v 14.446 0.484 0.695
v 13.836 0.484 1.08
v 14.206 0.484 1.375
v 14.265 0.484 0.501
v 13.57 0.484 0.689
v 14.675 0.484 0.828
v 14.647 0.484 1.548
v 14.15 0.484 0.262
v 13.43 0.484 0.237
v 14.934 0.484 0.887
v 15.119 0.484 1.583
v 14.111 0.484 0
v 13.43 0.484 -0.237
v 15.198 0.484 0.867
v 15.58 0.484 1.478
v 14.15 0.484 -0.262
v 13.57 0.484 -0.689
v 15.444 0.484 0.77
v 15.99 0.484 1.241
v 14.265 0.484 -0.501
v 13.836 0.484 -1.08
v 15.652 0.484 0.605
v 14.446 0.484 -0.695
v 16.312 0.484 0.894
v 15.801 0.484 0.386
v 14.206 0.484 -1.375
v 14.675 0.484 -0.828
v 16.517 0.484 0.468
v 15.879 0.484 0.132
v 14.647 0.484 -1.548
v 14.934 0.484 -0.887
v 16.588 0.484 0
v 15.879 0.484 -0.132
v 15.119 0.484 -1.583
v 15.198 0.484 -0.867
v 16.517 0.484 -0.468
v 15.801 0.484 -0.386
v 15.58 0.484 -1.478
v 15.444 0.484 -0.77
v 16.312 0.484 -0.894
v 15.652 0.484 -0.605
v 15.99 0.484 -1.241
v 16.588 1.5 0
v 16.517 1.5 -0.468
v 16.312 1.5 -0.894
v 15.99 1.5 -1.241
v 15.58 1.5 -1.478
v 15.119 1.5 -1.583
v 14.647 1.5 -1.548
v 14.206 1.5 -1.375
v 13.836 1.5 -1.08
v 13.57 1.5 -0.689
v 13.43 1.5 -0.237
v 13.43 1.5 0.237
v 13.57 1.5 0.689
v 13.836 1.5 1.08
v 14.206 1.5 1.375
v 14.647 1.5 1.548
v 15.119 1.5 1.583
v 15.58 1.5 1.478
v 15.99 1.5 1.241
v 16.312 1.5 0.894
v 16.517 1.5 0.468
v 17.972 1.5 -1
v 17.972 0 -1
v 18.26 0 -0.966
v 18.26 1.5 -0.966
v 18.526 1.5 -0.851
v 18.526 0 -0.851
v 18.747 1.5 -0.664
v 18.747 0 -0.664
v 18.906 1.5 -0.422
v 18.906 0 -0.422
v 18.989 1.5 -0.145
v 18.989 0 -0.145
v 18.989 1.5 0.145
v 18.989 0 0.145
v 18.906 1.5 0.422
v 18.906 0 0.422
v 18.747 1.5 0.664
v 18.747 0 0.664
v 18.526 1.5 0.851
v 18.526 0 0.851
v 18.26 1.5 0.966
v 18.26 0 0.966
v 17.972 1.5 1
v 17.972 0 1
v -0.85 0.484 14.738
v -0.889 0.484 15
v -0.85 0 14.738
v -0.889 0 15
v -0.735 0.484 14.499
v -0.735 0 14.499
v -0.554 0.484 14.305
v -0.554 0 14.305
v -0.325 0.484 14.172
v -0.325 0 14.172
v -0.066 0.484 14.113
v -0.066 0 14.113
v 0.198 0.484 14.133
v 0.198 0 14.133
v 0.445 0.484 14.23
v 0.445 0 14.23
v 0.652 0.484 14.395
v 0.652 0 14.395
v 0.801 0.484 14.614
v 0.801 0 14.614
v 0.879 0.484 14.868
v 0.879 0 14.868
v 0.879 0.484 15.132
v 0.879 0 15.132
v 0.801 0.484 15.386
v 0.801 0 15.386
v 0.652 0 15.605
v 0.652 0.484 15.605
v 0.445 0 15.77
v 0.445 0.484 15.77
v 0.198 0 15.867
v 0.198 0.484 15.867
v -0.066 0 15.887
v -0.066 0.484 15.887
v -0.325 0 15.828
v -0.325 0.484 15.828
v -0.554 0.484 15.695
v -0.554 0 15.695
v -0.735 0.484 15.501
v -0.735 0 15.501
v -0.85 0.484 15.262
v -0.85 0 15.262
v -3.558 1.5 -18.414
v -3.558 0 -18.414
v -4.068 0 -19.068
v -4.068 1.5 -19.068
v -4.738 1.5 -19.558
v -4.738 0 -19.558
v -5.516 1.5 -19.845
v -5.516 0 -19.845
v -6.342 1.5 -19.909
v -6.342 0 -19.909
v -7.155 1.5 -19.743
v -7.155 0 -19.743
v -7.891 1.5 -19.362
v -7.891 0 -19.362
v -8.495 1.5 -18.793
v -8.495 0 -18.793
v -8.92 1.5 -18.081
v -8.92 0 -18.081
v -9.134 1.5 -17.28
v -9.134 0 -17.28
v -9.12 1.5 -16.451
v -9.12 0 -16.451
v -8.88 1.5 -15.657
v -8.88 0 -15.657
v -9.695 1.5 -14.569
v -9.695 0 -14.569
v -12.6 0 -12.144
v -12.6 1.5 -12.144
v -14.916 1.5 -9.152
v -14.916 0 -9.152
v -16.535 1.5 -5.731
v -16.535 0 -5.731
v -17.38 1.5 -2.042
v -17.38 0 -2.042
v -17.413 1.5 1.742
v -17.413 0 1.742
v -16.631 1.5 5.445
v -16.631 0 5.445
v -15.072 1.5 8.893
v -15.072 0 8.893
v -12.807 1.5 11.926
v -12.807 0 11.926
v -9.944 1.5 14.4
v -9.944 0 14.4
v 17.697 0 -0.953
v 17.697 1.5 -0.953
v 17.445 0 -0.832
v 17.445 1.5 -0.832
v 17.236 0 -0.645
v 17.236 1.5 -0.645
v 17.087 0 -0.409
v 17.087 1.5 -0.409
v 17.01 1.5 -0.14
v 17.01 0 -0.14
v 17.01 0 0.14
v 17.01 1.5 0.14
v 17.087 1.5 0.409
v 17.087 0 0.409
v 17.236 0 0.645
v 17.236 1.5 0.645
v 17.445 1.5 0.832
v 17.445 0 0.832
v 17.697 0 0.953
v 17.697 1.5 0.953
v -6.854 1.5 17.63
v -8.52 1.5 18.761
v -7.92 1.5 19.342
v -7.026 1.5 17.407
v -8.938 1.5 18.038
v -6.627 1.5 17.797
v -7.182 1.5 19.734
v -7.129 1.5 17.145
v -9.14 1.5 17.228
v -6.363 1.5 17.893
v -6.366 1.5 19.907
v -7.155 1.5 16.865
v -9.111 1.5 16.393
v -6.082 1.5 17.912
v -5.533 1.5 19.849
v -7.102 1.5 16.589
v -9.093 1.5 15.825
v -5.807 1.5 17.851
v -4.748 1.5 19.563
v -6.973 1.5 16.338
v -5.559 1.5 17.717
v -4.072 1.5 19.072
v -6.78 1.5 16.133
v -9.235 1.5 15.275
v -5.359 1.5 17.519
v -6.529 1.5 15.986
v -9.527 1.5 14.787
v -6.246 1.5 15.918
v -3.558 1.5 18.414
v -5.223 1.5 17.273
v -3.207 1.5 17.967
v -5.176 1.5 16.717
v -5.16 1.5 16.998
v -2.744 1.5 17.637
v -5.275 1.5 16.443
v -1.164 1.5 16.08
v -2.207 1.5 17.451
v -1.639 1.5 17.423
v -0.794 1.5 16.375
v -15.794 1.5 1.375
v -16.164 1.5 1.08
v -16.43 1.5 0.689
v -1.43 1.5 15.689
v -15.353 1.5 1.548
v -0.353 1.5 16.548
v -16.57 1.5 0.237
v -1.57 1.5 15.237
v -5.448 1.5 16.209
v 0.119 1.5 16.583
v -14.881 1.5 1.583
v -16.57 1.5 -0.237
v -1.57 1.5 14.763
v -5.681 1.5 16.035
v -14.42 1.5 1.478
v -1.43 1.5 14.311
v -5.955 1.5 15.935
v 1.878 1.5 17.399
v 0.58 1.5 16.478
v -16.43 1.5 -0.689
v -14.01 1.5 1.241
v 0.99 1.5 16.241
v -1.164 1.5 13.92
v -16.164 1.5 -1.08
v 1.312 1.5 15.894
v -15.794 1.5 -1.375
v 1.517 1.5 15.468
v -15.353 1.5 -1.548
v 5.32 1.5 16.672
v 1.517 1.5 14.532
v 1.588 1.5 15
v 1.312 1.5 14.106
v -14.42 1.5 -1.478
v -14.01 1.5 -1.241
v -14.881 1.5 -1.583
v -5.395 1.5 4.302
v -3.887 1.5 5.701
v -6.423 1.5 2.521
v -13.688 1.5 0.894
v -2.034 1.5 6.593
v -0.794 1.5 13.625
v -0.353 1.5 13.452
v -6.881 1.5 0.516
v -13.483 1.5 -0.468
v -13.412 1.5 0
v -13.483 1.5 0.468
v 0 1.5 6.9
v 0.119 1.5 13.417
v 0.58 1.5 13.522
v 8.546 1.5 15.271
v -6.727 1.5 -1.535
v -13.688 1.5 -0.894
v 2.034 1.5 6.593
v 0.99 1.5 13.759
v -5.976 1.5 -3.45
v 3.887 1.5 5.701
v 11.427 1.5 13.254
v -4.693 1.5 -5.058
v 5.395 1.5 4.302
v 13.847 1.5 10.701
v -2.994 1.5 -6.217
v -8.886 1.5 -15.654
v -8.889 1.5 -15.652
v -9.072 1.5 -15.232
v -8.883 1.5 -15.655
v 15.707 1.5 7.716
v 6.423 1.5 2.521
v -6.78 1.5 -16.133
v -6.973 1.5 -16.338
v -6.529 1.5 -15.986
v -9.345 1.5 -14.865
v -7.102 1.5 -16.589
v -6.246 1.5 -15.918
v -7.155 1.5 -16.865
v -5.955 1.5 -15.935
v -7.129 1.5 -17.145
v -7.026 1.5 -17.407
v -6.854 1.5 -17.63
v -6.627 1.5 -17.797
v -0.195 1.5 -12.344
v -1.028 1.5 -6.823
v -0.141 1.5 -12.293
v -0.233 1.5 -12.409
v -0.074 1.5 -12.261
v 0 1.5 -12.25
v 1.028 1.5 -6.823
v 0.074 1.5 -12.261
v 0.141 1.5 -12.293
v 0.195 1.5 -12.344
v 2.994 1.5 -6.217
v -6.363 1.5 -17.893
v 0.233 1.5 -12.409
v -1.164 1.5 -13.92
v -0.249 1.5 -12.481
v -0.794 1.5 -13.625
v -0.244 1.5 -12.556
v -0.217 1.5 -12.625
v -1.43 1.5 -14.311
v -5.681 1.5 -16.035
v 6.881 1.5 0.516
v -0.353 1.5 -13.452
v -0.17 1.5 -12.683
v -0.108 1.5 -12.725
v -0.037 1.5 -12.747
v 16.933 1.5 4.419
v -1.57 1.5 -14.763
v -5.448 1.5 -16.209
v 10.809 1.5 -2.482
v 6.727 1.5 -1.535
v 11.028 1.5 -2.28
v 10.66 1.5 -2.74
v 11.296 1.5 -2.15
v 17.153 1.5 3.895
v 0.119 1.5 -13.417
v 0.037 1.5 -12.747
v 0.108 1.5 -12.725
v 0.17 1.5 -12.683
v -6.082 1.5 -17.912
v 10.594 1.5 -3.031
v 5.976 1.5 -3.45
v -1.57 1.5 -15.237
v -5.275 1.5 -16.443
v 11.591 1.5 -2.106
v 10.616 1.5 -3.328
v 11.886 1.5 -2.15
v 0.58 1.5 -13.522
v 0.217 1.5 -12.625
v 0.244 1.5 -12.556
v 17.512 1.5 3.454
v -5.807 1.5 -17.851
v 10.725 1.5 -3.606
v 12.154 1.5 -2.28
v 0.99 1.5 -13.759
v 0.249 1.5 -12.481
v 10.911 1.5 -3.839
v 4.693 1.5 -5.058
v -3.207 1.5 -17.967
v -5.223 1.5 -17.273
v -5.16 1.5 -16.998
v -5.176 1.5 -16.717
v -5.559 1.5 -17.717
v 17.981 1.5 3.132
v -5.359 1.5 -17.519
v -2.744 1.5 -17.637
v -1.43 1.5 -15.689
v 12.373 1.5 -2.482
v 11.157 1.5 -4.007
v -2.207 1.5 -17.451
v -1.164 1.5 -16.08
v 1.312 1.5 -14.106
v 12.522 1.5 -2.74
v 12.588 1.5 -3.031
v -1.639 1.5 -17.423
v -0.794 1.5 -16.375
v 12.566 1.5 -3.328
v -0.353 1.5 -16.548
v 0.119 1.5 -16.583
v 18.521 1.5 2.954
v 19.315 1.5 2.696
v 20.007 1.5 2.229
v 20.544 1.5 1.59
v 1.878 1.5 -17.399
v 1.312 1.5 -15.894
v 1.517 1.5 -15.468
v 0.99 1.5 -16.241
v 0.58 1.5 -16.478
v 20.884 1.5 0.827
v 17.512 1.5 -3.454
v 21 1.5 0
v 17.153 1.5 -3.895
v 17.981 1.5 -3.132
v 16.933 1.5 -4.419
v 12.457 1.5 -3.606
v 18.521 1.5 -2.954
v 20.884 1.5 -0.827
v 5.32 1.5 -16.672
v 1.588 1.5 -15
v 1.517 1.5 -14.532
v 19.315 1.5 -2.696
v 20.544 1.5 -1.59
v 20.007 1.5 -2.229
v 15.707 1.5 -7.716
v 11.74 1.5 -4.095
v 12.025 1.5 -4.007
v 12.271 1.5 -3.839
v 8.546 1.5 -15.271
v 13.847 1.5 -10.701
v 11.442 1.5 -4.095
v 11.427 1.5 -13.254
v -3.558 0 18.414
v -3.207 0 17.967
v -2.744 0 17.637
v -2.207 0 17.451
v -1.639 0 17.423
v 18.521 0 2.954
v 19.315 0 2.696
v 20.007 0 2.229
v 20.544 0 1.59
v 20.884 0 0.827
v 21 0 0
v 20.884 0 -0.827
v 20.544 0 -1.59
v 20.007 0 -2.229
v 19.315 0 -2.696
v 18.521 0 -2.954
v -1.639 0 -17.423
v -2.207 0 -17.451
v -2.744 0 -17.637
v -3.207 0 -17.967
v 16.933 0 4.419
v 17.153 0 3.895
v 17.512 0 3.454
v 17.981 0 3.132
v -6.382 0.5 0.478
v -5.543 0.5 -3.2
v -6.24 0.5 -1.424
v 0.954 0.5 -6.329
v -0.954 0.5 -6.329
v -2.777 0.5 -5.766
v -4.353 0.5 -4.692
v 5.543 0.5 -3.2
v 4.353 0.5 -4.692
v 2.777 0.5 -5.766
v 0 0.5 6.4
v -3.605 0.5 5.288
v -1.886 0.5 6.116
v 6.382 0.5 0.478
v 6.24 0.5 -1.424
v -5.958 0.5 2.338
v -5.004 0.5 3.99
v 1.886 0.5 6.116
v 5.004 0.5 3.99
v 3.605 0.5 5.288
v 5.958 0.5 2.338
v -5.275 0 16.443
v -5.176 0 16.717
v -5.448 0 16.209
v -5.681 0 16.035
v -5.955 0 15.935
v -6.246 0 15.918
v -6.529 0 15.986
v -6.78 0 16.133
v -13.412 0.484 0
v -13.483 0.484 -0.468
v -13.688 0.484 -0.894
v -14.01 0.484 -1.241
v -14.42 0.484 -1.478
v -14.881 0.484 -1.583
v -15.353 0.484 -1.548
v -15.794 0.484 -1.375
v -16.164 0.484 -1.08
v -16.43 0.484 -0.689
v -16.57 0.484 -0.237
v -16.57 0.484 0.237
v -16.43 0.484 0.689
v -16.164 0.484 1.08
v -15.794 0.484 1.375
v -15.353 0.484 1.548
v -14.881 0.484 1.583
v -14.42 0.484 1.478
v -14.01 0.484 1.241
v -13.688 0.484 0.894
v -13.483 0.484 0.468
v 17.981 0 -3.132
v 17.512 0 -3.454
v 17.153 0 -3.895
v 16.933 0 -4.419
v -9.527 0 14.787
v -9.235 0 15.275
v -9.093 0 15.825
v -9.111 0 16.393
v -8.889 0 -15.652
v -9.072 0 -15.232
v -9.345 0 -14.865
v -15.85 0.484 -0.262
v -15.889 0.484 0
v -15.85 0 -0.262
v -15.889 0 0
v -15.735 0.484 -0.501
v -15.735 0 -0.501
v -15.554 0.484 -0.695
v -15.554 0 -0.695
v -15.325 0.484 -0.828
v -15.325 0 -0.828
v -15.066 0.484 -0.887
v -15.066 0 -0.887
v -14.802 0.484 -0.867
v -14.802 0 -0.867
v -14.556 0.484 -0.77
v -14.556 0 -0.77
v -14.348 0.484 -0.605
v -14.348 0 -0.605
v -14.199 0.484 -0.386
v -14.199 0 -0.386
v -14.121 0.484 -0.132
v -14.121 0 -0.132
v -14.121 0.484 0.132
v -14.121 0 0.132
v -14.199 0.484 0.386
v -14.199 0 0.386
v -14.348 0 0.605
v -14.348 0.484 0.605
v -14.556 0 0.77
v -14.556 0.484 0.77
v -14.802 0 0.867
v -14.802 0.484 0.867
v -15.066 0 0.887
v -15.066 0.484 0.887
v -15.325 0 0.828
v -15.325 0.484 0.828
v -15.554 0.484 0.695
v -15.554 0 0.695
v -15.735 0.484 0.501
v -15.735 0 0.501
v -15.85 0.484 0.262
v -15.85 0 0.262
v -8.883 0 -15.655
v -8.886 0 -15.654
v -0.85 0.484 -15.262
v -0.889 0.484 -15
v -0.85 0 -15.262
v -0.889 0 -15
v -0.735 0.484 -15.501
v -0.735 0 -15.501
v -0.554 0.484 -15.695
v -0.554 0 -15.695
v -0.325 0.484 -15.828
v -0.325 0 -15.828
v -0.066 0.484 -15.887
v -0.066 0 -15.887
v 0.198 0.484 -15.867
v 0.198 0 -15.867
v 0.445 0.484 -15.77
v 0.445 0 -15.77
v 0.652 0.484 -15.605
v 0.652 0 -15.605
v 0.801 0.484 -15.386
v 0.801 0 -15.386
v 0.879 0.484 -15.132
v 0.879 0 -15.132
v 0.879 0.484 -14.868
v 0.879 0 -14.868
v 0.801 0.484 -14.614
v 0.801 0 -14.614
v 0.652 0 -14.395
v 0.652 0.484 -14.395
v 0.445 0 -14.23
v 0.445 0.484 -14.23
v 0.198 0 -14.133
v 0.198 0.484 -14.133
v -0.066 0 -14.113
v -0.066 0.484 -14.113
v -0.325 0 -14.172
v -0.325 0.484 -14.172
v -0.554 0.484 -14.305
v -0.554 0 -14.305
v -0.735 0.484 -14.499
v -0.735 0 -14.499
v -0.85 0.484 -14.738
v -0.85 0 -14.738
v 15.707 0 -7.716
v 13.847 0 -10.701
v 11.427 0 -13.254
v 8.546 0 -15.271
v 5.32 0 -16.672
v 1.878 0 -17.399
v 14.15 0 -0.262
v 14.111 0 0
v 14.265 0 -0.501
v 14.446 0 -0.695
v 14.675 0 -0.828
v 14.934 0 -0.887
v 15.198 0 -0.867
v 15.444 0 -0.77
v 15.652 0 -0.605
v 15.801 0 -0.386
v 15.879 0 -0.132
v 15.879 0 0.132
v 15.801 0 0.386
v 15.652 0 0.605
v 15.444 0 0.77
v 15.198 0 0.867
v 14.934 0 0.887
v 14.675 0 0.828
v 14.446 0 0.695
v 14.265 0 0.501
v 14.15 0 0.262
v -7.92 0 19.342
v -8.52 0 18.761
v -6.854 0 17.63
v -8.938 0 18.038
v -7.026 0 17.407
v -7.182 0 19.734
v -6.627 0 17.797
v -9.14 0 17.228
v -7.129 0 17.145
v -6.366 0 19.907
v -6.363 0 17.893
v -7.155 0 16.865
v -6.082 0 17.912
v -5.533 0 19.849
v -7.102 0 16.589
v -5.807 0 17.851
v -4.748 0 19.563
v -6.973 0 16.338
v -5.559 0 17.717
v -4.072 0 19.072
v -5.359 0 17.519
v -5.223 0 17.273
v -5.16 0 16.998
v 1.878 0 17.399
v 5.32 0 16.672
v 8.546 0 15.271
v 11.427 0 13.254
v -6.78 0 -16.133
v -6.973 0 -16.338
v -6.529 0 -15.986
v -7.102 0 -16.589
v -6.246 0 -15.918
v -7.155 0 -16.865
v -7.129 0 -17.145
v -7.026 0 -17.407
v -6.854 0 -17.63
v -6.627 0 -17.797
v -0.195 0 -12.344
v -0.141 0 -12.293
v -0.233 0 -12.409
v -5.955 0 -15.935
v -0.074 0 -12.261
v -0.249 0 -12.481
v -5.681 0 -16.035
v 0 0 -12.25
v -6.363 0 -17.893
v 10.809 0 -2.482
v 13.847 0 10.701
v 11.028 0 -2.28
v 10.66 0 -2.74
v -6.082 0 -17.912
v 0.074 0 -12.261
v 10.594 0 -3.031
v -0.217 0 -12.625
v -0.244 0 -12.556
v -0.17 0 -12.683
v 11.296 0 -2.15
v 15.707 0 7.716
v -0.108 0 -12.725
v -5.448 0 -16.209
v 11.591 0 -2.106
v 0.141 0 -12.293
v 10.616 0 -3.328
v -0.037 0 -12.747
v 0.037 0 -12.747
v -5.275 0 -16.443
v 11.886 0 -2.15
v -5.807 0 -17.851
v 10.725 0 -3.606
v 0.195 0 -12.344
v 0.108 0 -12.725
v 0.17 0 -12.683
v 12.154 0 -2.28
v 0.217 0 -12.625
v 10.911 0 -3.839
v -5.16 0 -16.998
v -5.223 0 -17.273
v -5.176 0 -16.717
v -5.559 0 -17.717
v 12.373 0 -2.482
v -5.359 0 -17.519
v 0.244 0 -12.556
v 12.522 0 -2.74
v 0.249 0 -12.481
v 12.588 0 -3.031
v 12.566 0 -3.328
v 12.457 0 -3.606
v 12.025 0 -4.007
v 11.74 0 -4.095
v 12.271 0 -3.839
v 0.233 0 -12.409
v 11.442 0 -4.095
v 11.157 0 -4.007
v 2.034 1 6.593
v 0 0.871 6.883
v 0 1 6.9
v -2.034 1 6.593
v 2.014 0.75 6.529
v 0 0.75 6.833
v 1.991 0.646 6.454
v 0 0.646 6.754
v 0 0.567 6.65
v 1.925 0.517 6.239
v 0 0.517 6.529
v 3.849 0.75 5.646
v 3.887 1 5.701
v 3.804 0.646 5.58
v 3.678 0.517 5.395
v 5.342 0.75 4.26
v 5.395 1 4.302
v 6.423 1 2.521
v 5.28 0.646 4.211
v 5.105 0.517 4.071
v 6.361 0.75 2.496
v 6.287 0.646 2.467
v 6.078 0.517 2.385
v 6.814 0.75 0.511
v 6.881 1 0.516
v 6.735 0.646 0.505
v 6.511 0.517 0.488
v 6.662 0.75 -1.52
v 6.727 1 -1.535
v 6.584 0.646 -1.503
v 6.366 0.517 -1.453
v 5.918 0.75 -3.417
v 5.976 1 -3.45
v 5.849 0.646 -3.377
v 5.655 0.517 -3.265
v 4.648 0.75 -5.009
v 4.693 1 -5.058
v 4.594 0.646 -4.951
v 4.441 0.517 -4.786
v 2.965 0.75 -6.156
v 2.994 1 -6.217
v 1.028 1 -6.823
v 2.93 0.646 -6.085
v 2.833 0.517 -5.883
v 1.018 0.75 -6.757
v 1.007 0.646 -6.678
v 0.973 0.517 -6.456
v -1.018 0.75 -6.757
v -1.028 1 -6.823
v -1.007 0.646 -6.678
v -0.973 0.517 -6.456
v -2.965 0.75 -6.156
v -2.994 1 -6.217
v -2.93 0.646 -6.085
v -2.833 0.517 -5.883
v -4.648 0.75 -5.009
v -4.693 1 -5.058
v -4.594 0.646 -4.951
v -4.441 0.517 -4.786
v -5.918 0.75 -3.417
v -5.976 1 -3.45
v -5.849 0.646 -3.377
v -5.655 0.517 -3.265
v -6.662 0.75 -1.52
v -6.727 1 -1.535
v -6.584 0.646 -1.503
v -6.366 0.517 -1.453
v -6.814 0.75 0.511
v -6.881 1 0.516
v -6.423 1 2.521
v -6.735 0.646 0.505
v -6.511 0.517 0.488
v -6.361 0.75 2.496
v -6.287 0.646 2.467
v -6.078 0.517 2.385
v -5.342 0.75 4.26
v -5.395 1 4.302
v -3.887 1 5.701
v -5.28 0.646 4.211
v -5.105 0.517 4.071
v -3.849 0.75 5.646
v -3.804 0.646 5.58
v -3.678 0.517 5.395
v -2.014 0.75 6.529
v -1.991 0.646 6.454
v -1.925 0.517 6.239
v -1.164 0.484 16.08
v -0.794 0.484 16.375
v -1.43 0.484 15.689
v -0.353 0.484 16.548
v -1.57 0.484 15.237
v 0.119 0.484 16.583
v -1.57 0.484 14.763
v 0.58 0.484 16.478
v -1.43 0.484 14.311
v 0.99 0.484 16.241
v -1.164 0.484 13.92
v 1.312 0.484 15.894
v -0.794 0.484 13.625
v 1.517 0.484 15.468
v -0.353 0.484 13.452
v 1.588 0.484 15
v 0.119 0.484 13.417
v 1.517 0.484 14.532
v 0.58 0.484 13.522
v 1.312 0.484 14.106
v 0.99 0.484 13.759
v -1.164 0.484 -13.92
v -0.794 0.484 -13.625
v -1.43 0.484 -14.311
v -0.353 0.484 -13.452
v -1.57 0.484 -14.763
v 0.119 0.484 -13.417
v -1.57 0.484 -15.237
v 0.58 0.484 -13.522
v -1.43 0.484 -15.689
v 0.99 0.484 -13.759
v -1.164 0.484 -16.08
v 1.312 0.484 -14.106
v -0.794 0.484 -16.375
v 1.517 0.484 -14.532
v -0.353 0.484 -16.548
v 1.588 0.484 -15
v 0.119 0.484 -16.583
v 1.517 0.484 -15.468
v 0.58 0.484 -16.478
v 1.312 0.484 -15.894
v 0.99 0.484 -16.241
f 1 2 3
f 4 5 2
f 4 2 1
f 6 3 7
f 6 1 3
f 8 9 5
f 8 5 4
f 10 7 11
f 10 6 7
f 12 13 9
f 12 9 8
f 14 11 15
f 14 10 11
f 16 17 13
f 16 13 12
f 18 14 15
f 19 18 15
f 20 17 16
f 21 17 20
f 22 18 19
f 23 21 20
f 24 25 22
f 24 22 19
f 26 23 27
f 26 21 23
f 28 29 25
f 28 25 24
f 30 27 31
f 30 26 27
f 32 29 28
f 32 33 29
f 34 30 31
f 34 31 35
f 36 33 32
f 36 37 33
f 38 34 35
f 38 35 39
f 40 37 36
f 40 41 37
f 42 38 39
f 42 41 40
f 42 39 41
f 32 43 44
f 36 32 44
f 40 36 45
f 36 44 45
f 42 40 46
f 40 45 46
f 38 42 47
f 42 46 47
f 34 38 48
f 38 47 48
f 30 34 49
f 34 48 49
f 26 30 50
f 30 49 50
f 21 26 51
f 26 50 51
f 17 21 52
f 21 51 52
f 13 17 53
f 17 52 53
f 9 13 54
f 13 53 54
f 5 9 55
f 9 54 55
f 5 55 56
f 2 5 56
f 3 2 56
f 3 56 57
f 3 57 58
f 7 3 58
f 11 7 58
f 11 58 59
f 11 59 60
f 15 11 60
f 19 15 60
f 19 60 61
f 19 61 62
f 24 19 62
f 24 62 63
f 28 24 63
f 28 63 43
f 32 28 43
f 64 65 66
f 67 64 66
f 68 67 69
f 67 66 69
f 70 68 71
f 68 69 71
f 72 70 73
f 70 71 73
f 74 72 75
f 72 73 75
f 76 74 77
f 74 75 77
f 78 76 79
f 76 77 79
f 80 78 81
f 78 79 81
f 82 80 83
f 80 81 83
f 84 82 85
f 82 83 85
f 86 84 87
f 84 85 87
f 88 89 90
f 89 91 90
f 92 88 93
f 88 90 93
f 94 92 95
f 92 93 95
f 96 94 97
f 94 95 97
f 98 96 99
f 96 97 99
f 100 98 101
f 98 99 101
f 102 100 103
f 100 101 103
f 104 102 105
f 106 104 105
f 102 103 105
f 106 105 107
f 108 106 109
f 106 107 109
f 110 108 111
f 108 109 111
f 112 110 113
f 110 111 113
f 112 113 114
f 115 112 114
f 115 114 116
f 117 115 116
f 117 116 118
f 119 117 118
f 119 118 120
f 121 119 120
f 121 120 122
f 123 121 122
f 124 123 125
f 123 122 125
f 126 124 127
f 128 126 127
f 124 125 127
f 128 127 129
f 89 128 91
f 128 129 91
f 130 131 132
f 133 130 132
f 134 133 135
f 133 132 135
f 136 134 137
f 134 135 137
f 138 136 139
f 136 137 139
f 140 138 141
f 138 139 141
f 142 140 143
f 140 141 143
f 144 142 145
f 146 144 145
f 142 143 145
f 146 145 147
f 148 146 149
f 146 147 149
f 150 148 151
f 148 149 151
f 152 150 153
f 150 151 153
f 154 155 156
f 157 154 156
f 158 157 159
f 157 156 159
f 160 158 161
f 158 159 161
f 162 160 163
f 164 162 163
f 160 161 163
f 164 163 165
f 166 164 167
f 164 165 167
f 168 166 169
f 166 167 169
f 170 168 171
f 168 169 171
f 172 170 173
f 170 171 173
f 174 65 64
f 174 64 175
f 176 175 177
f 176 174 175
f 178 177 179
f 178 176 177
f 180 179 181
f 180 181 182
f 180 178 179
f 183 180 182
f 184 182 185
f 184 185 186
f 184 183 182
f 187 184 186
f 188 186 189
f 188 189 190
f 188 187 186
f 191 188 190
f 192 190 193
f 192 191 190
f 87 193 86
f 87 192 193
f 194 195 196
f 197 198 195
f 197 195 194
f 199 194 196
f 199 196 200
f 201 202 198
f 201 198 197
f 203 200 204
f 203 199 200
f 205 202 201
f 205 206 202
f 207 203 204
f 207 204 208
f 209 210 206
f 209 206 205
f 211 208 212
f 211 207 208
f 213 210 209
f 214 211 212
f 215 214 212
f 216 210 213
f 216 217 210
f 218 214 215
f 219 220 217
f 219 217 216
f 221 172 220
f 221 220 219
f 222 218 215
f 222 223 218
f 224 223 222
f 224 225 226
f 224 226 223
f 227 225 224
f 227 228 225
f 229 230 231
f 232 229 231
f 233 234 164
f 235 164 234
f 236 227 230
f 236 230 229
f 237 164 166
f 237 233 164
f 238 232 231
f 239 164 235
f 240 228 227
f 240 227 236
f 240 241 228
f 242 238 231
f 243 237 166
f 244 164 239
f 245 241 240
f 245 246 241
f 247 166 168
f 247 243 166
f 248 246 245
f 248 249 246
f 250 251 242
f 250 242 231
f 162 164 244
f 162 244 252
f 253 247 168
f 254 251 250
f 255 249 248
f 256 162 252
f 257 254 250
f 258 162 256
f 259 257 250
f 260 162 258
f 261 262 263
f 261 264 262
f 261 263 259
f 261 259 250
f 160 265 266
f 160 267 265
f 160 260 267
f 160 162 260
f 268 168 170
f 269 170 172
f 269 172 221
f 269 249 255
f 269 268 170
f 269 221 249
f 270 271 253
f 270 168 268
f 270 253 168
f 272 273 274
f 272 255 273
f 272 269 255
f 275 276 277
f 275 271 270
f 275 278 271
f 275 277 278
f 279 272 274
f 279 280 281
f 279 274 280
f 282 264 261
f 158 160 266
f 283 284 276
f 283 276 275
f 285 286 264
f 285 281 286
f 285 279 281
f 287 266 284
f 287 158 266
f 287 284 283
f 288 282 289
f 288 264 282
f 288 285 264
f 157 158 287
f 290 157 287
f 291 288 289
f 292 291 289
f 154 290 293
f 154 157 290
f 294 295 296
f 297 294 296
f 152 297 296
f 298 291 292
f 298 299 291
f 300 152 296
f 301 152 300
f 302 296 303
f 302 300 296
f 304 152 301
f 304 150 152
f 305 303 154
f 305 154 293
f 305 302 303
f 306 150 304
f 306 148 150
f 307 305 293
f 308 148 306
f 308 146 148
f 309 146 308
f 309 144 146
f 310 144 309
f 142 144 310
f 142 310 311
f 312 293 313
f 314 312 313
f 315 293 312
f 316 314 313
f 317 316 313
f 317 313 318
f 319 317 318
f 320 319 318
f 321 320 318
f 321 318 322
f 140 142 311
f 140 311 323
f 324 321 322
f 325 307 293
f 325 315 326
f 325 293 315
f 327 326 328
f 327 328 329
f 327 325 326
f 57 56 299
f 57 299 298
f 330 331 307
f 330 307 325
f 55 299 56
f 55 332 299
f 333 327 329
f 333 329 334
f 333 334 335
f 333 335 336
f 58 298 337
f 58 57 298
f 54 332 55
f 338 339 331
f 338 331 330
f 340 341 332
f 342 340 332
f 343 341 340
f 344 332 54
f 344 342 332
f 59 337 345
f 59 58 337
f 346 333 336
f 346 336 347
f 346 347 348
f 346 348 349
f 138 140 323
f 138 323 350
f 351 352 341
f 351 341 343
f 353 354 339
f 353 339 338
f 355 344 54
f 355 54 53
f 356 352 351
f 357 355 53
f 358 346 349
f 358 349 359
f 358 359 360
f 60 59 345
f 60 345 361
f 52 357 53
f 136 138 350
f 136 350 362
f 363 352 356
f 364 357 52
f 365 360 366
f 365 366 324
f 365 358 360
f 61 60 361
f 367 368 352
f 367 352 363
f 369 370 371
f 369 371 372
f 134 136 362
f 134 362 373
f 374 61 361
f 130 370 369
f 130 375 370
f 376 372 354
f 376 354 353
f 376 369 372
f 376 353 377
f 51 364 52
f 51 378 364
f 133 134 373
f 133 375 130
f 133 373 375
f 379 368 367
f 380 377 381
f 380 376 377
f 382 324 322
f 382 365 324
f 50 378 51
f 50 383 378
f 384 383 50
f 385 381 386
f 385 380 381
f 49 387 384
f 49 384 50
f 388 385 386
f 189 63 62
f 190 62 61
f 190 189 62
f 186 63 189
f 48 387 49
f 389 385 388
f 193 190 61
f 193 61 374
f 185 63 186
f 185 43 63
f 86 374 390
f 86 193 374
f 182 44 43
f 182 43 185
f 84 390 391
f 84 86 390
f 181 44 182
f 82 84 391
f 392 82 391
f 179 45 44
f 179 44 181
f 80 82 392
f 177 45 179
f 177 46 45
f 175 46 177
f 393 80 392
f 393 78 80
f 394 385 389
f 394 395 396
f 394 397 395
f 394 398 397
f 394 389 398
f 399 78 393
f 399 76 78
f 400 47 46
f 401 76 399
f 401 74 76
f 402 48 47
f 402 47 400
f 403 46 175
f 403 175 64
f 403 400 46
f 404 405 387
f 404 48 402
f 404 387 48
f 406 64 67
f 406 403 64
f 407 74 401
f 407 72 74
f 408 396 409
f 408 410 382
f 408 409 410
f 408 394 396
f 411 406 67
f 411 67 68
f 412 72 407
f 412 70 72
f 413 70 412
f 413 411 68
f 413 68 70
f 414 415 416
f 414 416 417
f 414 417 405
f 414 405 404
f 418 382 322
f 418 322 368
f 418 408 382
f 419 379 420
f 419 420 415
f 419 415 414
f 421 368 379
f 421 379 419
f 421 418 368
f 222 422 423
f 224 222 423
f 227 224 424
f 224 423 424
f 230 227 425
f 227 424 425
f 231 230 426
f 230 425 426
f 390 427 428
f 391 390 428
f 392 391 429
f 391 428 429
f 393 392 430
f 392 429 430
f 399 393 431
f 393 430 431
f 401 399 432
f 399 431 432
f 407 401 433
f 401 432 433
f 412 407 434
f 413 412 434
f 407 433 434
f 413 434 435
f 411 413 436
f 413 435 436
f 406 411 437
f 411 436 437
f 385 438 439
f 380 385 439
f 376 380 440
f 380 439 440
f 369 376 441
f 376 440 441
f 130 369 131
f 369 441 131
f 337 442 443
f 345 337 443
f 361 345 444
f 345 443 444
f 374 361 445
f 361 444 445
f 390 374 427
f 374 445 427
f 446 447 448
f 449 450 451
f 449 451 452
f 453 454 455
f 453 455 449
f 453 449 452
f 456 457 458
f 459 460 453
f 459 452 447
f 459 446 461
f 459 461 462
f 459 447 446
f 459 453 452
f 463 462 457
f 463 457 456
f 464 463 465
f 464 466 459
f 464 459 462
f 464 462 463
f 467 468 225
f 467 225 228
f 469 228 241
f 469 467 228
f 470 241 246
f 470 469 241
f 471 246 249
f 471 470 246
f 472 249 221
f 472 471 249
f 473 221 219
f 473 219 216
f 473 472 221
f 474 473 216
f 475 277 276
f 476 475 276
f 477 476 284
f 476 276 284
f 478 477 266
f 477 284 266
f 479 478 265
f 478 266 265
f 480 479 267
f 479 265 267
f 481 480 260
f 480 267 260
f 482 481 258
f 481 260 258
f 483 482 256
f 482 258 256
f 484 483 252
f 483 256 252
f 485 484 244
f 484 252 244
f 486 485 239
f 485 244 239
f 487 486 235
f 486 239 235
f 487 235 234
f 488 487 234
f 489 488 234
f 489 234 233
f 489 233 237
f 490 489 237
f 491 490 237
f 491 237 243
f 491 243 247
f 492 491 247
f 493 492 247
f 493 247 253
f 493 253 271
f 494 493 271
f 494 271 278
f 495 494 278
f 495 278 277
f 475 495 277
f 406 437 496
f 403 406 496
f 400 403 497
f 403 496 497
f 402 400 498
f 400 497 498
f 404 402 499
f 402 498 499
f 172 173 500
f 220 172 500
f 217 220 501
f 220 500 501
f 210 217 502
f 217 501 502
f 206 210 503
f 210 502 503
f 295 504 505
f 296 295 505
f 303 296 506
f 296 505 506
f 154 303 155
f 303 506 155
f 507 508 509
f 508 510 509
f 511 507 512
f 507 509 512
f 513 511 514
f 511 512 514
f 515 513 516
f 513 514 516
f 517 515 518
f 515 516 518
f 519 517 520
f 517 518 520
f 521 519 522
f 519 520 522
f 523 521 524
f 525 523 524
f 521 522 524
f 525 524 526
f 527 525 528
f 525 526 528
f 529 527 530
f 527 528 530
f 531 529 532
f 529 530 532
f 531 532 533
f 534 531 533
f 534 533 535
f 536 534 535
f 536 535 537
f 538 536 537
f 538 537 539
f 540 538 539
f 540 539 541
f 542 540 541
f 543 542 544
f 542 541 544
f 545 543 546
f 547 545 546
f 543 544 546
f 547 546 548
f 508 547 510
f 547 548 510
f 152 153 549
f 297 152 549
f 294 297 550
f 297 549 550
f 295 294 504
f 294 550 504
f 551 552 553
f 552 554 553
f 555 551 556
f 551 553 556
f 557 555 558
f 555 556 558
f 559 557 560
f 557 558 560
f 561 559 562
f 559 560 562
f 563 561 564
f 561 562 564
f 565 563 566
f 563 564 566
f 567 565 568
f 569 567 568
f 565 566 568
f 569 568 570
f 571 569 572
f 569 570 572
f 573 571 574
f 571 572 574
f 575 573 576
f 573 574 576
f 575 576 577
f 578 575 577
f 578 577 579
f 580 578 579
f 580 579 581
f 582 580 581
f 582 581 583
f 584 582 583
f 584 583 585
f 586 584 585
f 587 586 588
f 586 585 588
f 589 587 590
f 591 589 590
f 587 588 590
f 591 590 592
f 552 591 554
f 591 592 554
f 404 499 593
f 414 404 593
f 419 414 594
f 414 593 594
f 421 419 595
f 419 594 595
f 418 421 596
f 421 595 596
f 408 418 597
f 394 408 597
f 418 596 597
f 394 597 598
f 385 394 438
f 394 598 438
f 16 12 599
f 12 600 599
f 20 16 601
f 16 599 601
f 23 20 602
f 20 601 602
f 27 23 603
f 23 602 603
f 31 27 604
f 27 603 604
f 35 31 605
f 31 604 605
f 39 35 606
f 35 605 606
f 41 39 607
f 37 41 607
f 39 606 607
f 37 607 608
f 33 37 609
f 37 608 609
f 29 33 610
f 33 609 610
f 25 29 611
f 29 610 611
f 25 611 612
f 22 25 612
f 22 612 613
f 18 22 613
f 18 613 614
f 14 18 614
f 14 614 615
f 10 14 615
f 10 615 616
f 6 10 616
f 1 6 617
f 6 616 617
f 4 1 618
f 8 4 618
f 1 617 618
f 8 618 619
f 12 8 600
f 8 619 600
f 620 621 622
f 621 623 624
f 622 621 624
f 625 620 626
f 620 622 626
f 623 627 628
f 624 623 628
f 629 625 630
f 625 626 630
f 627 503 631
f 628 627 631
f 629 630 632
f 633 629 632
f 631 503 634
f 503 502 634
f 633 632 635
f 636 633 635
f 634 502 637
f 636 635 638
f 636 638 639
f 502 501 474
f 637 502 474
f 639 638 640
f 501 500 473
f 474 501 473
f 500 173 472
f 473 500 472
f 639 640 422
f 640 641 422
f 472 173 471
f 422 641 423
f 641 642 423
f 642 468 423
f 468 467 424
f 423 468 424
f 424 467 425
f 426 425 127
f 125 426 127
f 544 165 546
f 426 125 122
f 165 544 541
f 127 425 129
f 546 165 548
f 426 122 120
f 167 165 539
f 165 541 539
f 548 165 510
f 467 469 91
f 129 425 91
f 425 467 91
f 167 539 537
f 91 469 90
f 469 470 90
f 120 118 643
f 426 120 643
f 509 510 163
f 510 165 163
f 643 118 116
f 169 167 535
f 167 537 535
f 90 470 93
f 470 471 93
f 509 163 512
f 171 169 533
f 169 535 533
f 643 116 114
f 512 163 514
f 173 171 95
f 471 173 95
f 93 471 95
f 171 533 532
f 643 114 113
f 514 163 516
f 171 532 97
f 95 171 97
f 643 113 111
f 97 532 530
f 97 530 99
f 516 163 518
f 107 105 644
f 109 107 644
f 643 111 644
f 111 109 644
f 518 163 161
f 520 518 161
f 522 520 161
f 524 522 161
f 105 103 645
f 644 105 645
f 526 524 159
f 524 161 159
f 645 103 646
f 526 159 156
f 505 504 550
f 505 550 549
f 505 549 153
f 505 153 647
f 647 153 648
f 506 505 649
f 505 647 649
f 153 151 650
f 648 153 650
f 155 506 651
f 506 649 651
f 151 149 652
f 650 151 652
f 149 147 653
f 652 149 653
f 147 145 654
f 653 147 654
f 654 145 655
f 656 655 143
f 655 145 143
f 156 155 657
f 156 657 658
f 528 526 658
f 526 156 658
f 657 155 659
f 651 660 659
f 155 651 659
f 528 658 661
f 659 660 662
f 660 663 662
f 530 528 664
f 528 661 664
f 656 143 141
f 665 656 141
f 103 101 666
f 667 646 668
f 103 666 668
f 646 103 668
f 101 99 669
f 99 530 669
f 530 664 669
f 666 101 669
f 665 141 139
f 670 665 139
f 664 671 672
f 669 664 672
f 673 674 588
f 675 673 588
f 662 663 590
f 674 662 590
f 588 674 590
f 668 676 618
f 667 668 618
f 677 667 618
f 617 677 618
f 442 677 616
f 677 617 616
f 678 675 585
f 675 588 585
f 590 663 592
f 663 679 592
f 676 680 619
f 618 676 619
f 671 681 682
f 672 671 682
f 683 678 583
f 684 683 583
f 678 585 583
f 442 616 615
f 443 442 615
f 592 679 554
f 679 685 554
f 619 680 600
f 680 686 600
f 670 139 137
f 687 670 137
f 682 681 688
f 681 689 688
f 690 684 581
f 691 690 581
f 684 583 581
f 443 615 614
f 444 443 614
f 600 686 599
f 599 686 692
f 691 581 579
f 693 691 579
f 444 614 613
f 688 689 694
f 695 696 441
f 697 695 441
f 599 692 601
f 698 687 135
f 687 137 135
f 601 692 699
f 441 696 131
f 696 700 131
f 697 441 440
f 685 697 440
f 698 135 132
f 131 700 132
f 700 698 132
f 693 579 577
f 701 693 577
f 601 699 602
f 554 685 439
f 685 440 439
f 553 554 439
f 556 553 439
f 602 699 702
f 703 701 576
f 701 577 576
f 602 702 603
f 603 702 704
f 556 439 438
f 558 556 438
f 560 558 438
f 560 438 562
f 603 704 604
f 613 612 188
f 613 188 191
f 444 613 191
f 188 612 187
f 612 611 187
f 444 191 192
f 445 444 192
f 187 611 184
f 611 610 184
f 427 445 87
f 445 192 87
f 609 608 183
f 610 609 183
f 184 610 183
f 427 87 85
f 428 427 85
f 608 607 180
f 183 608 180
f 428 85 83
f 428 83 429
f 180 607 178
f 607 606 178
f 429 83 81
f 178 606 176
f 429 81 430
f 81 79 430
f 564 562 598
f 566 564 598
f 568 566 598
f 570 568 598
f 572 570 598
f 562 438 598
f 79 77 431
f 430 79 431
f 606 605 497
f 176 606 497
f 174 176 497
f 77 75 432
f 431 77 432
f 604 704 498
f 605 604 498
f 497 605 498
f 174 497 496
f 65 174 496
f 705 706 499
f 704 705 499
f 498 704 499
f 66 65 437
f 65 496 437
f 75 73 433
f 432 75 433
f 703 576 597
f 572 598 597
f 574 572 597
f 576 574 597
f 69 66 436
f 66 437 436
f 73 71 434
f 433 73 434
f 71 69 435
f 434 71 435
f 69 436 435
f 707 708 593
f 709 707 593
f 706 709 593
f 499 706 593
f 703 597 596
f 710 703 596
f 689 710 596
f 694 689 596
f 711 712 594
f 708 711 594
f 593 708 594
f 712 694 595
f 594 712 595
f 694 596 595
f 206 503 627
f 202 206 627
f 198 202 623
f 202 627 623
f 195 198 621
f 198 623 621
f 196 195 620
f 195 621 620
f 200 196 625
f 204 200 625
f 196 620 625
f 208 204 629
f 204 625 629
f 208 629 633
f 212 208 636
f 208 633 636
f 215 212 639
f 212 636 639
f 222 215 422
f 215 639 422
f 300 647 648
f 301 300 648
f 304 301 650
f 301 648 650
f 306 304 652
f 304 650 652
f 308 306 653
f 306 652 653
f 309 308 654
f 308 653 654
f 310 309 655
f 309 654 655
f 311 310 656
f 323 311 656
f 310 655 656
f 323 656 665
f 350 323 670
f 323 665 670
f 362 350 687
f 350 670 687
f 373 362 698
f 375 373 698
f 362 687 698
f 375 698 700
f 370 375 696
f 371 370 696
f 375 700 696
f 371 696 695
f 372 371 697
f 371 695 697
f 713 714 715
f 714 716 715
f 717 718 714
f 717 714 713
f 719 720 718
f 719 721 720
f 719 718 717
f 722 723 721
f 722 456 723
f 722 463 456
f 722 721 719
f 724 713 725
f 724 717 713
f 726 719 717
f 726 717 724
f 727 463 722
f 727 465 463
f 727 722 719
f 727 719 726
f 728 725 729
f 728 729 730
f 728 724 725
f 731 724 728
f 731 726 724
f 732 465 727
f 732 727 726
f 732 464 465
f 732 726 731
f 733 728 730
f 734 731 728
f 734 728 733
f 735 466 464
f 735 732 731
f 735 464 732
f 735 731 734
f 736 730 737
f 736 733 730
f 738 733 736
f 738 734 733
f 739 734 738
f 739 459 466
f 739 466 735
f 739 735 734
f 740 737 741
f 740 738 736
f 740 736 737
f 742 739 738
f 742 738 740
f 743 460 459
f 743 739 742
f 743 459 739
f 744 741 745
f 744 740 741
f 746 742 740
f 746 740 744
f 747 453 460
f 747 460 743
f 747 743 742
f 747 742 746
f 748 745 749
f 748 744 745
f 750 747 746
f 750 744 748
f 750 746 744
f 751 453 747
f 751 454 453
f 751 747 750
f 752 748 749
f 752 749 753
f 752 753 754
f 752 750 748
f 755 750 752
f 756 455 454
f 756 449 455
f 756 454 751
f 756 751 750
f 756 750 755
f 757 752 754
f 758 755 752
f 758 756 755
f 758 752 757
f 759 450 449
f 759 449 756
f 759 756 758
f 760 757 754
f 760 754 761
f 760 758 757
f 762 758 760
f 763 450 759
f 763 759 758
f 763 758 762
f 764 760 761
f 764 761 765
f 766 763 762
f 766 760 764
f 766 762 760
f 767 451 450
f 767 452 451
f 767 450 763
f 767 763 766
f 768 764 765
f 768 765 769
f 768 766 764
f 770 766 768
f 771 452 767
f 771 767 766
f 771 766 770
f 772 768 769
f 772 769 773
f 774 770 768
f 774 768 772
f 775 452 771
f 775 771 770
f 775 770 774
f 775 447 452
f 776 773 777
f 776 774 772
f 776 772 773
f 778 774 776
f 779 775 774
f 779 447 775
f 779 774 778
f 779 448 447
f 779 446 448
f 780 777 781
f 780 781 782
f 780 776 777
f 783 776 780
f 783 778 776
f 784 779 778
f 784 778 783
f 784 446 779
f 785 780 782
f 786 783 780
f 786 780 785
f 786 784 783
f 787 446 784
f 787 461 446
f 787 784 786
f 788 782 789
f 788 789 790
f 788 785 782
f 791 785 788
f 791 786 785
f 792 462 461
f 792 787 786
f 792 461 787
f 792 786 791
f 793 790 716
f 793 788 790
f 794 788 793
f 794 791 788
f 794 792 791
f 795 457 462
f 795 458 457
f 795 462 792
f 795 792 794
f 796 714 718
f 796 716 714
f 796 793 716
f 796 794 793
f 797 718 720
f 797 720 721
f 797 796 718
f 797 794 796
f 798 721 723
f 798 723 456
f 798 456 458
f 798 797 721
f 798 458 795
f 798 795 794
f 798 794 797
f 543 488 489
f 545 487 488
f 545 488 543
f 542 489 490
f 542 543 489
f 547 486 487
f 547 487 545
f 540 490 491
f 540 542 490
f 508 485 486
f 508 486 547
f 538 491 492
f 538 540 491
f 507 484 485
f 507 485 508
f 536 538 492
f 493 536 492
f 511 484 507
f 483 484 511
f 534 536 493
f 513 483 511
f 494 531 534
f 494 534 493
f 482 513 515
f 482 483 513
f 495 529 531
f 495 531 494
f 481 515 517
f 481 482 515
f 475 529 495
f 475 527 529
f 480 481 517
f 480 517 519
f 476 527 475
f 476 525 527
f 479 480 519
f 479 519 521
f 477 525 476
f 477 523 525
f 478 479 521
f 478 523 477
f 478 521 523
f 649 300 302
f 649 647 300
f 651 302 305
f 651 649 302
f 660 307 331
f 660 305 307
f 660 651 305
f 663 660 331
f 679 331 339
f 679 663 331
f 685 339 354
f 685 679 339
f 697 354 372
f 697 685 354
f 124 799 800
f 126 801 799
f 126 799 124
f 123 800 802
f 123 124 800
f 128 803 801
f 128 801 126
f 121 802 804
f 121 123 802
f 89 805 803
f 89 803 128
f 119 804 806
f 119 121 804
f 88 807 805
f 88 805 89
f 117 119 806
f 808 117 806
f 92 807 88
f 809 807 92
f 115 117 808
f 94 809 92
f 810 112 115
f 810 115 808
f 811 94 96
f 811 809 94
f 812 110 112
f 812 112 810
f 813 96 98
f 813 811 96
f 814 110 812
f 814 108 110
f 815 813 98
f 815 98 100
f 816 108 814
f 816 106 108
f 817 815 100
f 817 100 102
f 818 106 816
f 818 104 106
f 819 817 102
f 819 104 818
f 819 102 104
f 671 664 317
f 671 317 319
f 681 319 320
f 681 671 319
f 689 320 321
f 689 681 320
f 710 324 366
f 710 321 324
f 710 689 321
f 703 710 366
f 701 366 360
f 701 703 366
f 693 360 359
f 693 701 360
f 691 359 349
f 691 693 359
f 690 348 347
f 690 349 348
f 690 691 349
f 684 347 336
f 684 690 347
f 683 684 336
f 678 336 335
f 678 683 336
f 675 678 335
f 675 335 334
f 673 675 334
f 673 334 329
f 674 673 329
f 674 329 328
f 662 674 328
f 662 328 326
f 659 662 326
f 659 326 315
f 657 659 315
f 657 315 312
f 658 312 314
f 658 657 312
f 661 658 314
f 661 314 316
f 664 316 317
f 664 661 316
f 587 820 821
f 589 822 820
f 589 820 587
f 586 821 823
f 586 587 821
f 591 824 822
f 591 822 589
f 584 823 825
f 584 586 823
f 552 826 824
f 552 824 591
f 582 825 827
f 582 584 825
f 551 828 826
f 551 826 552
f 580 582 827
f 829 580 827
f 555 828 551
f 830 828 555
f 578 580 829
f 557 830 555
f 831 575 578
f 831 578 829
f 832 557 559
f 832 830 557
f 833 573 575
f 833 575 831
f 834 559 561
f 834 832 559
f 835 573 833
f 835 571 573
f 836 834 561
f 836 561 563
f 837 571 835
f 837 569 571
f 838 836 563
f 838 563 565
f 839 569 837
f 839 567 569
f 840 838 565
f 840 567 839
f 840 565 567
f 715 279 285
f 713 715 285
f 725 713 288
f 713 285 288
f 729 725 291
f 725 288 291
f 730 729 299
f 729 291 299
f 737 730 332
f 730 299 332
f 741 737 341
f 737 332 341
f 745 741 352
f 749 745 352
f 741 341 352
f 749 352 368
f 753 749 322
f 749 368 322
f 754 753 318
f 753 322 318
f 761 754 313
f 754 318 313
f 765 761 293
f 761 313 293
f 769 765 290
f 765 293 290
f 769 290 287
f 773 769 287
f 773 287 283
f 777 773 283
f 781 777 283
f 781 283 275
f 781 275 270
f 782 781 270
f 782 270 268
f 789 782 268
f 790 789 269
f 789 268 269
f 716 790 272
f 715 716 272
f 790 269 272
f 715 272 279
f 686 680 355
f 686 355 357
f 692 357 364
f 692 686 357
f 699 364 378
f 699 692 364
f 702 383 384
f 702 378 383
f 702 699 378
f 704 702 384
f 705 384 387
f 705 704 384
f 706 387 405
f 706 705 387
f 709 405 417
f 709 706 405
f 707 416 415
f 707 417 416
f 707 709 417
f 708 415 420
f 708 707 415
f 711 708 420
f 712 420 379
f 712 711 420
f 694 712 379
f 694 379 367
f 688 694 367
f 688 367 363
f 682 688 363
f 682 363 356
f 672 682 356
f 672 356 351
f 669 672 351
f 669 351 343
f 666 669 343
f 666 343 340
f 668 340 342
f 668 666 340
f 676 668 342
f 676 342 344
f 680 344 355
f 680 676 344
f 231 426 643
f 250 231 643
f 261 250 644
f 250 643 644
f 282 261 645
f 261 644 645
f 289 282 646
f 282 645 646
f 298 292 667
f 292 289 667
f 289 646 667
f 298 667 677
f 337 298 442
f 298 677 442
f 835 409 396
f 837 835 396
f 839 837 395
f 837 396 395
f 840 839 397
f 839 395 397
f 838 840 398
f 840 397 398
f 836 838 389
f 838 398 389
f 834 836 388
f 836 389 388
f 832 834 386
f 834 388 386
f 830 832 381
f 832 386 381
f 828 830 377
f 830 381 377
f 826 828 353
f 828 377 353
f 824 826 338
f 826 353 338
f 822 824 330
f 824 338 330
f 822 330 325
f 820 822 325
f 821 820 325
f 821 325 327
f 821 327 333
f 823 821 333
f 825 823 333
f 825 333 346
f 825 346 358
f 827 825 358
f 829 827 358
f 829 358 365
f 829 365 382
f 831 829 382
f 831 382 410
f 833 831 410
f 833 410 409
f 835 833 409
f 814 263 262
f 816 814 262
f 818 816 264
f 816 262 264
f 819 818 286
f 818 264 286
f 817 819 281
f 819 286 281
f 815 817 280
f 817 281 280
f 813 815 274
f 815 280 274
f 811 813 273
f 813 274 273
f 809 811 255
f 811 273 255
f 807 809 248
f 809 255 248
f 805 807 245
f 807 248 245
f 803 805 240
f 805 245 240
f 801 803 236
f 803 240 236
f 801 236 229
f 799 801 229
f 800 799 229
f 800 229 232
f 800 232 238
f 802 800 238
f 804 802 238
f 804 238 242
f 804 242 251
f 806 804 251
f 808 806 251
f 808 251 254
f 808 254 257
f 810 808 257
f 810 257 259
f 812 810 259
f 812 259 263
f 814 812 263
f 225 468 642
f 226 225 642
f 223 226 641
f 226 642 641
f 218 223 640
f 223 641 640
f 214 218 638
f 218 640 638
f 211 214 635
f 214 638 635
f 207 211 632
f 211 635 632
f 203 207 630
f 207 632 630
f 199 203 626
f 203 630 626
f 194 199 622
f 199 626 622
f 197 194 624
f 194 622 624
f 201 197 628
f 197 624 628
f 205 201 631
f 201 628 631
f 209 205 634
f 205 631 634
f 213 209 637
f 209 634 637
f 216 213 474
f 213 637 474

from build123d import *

# Parameters (mm, degrees)
SKETCH1_R                                      = 17.5
BOSS_EXTRUDE1_DEPTH                            = 1.5
CUT_EXTRUDE1_DEPTH                             = 25.794152536
CUT_EXTRUDE1_DEPTH_BACK                        = 25.794152536
SKETCH6_R                                      = 0.25
SKETCH6_R_2                                    = 1
CBORE_FOR_0_SOCKET_HEAD_CAP_SCREW1_D           = 1.778
CBORE_FOR_0_SOCKET_HEAD_CAP_SCREW1_CBORE_D     = 3.175
CBORE_FOR_0_SOCKET_HEAD_CAP_SCREW1_CBORE_DEPTH = 1.016
BOSS_EXTRUDE2_START                            = -1.5
BOSS_EXTRUDE2_DEPTH                            = 1.5
FILLET1_DEPTH                                  = 1.5
CUT_EXTRUDE2_START                             = -10
SKETCH16_R                                     = 1
CUT_EXTRUDE2_DEPTH                             = 10
SKETCH17_R                                     = 6.9
CUT_EXTRUDE3_DEPTH                             = 1
FILLET2_R                                      = 0.5


with BuildPart() as part:
    # Sketch1 → Boss-Extrude1 (new body)
    with BuildSketch(Plane(origin=(0, 0, 0), x_dir=(1, 0, 0), z_dir=(0, 1, 0))):
        with Locations(Location((0, 0, 0), (0, 0, 270))):
            Circle(SKETCH1_R)
    extrude(amount=BOSS_EXTRUDE1_DEPTH)

    # Sketch6 → Cut-Extrude1 (cut, two sides: drawn at the far end of the back side and taken through both)
    with BuildSketch(Plane(origin=(0, 1.5, 0), x_dir=(1, 0, 0), z_dir=(0, 1, 0)).offset(-CUT_EXTRUDE1_DEPTH_BACK)):
        with Locations(Location((0, 12.5, 0), (0, 0, 270))):
            Circle(SKETCH6_R)
        with Locations(Location((11.591109915, 3.105828541, 0), (0, 0, 270))):
            Circle(SKETCH6_R_2)
    extrude(amount=CUT_EXTRUDE1_DEPTH + CUT_EXTRUDE1_DEPTH_BACK, mode=Mode.SUBTRACT)

    # CBORE for #0 Socket Head Cap Screw1 (through all)
    with Locations(Plane(origin=(0, 1.5, 0), x_dir=(1, 0, 0), z_dir=(0, 1, 0))):
        with Locations((0, 15), (-15, 0), (0, -15), (15, 0)):
            CounterBoreHole(CBORE_FOR_0_SOCKET_HEAD_CAP_SCREW1_D / 2, CBORE_FOR_0_SOCKET_HEAD_CAP_SCREW1_CBORE_D / 2, CBORE_FOR_0_SOCKET_HEAD_CAP_SCREW1_CBORE_DEPTH)

    # Sketch15 → Boss-Extrude2 (add)
    # profile 1 of 3: a face of its own
    with BuildSketch(Plane(origin=(0, 1.5, 0), x_dir=(1, 0, 0), z_dir=(0, 1, 0)).offset(BOSS_EXTRUDE2_START)):
        with BuildLine():
            ThreePointArc((-5.176050603, 16.717012297), (-4.139884011, 17.00327499), (-3.0880962, 17.225378424))
            Line((-3.0880962, 17.225378424), (-3.2615852, 17.702035532))
            ThreePointArc((-3.2615852, 17.702035532), (-7.18242301, 19.733545037), (-8.880129888, 15.657052506))
            ThreePointArc((-8.880129888, 15.657052506), (-8.884731942, 15.654441488), (-8.889333228, 15.651829119))
            Line((-8.889333228, 15.651829119), (-8.715826512, 15.175123334))
            ThreePointArc((-8.715826512, 15.175123334), (-7.762905696, 15.68398212), (-6.780403574, 16.133075571))
            ThreePointArc((-6.780403574, 16.133075571), (-6.498382723, 17.854159795), (-5.176050603, 16.717012297))
        make_face()
    # profile 2 of 3: a face of its own
    with BuildSketch(Plane(origin=(0, 1.5, 0), x_dir=(1, 0, 0), z_dir=(0, 1, 0)).offset(BOSS_EXTRUDE2_START)):
        with BuildLine():
            ThreePointArc((17.242700391, 2.989863415), (17.499999999, 0.00015134), (17.242752101, -2.989565186))
            Line((17.242752101, -2.989565186), (17.75, -2.989565186))
            ThreePointArc((17.75, -2.989565186), (21, 0), (17.75, 2.989565186))
            Line((17.75, 2.989565186), (17.242700391, 2.989863415))
        make_face()
        with BuildLine():
            ThreePointArc((17.972222222, 0.999614123), (19, 0), (17.972222222, -0.999614123))
            ThreePointArc((17.972222222, -0.999614123), (18, 0), (17.972222222, 0.999614123))
        make_face(mode=Mode.SUBTRACT)
    # profile 3 of 3: a face of its own
    with BuildSketch(Plane(origin=(0, 1.5, 0), x_dir=(1, 0, 0), z_dir=(0, 1, 0)).offset(BOSS_EXTRUDE2_START)):
        with BuildLine():
            ThreePointArc((-8.880129888, -15.657052506), (-6.943930938, -19.809244554), (-3.170985611, -17.210312323))
            ThreePointArc((-3.170985611, -17.210312323), (-4.180800117, -16.993260734), (-5.176050603, -16.717012297))
            ThreePointArc((-5.176050603, -16.717012297), (-6.498382723, -17.854159795), (-6.780403574, -16.133075571))
            ThreePointArc((-6.780403574, -16.133075571), (-7.758295007, -15.686263372), (-8.706903461, -15.180244798))
            Line((-8.706903461, -15.180244798), (-8.880129888, -15.657052506))
        make_face()
    extrude(amount=BOSS_EXTRUDE2_DEPTH)

    # Fillet1: read off the stored shape, not the designer's step
    # Fillet1 outline → Fillet1 (add)
    with BuildSketch(Plane(origin=(0, 0, 0), x_dir=(1, 0, 0), z_dir=(0, 1, 0))):
        with BuildLine():
            ThreePointArc((-8.889333228, 15.651829119), (-9.197952649, 15.040582781), (-9.694667487, 14.56926293))
            ThreePointArc((-9.694667487, 14.56926293), (-9.210230129, 14.880243982), (-8.715826512, 15.175123334))
            Line((-8.715826512, 15.175123334), (-8.889333228, 15.651829119))
        make_face()
        with BuildLine():
            ThreePointArc((-9.943920594, -14.400293164), (-9.235099699, -15.274689897), (-9.110766229, -16.393411442))
            ThreePointArc((-9.110766229, -16.393411442), (-9.019221723, -16.017785781), (-8.880129888, -15.657052506))
            Line((-8.880129888, -15.657052506), (-8.706903461, -15.180244798))
            ThreePointArc((-8.706903461, -15.180244798), (-9.33356259, -14.803195918), (-9.943920594, -14.400293164))
        make_face()
        with BuildLine():
            ThreePointArc((-3.0880962, 17.225378424), (-2.365537121, 17.339383902), (-1.638844908, 17.423093507))
            ThreePointArc((-1.638844908, 17.423093507), (-2.743884601, 17.637298977), (-3.558229913, 18.414369386))
            ThreePointArc((-3.558229913, 18.414369386), (-3.386909552, 18.067779761), (-3.2615852, 17.702035532))
            Line((-3.2615852, 17.702035532), (-3.0880962, 17.225378424))
        make_face()
        with BuildLine():
            ThreePointArc((17.75, 2.989565186), (18.136550606, 2.996890711), (18.520833333, 2.954442865))
            ThreePointArc((18.520833333, 2.954442865), (17.512103504, 3.453903412), (16.93287037, 4.419038472))
            ThreePointArc((16.93287037, 4.419038472), (17.102720385, 3.707688694), (17.242700391, 2.989863415))
            Line((17.242700391, 2.989863415), (17.75, 2.989565186))
        make_face()
        with BuildLine():
            ThreePointArc((17.242752101, -2.989565186), (17.102752448, -3.70754079), (16.932870371, -4.419038472))
            ThreePointArc((16.932870371, -4.419038472), (17.512103504, -3.453903412), (18.520833333, -2.954442864))
            ThreePointArc((18.520833333, -2.954442864), (18.136550606, -2.996890711), (17.75, -2.989565186))
            Line((17.75, -2.989565186), (17.242752101, -2.989565186))
        make_face()
        with BuildLine():
            ThreePointArc((-3.558229913, -18.414369386), (-2.743884601, -17.637298977), (-1.638844908, -17.423093507))
            ThreePointArc((-1.638844908, -17.423093507), (-2.407267406, -17.333639653), (-3.170985611, -17.210312323))
            ThreePointArc((-3.170985611, -17.210312323), (-3.300433079, -17.832980475), (-3.558229913, -18.414369386))
        make_face()
    extrude(amount=FILLET1_DEPTH)

    # Sketch16 → Cut-Extrude2 (cut)
    with BuildSketch(Plane(origin=(0, 1.5, 0), x_dir=(1, 0, 0), z_dir=(0, 1, 0)).offset(CUT_EXTRUDE2_START)):
        with Locations(Location((-6.15636258, 16.914467174, 0), (0, 0, 270))):
            Circle(SKETCH16_R)
        with Locations(Location((18, 0, 0), (0, 0, 270))):
            Circle(SKETCH16_R)
        with Locations(Location((-6.15636258, -16.914467174, 0), (0, 0, 270))):
            Circle(SKETCH16_R)
    extrude(amount=CUT_EXTRUDE2_DEPTH, mode=Mode.SUBTRACT)

    # Sketch17 → Cut-Extrude3 (cut)
    with BuildSketch(Plane(origin=(0, 1.5, 0), x_dir=(1, 0, 0), z_dir=(0, 1, 0))):
        with Locations(Location((0, 0, 0), (0, 0, 270))):
            Circle(SKETCH17_R)
    extrude(amount=-CUT_EXTRUDE3_DEPTH, mode=Mode.SUBTRACT)

    # Fillet2
    fillet2_edges = [part.edges().sort_by_distance(p)[0] for p in [
        (0, 0.5, -6.9),
    ]]
    fillet(fillet2_edges, radius=FILLET2_R)


solid = part.part
